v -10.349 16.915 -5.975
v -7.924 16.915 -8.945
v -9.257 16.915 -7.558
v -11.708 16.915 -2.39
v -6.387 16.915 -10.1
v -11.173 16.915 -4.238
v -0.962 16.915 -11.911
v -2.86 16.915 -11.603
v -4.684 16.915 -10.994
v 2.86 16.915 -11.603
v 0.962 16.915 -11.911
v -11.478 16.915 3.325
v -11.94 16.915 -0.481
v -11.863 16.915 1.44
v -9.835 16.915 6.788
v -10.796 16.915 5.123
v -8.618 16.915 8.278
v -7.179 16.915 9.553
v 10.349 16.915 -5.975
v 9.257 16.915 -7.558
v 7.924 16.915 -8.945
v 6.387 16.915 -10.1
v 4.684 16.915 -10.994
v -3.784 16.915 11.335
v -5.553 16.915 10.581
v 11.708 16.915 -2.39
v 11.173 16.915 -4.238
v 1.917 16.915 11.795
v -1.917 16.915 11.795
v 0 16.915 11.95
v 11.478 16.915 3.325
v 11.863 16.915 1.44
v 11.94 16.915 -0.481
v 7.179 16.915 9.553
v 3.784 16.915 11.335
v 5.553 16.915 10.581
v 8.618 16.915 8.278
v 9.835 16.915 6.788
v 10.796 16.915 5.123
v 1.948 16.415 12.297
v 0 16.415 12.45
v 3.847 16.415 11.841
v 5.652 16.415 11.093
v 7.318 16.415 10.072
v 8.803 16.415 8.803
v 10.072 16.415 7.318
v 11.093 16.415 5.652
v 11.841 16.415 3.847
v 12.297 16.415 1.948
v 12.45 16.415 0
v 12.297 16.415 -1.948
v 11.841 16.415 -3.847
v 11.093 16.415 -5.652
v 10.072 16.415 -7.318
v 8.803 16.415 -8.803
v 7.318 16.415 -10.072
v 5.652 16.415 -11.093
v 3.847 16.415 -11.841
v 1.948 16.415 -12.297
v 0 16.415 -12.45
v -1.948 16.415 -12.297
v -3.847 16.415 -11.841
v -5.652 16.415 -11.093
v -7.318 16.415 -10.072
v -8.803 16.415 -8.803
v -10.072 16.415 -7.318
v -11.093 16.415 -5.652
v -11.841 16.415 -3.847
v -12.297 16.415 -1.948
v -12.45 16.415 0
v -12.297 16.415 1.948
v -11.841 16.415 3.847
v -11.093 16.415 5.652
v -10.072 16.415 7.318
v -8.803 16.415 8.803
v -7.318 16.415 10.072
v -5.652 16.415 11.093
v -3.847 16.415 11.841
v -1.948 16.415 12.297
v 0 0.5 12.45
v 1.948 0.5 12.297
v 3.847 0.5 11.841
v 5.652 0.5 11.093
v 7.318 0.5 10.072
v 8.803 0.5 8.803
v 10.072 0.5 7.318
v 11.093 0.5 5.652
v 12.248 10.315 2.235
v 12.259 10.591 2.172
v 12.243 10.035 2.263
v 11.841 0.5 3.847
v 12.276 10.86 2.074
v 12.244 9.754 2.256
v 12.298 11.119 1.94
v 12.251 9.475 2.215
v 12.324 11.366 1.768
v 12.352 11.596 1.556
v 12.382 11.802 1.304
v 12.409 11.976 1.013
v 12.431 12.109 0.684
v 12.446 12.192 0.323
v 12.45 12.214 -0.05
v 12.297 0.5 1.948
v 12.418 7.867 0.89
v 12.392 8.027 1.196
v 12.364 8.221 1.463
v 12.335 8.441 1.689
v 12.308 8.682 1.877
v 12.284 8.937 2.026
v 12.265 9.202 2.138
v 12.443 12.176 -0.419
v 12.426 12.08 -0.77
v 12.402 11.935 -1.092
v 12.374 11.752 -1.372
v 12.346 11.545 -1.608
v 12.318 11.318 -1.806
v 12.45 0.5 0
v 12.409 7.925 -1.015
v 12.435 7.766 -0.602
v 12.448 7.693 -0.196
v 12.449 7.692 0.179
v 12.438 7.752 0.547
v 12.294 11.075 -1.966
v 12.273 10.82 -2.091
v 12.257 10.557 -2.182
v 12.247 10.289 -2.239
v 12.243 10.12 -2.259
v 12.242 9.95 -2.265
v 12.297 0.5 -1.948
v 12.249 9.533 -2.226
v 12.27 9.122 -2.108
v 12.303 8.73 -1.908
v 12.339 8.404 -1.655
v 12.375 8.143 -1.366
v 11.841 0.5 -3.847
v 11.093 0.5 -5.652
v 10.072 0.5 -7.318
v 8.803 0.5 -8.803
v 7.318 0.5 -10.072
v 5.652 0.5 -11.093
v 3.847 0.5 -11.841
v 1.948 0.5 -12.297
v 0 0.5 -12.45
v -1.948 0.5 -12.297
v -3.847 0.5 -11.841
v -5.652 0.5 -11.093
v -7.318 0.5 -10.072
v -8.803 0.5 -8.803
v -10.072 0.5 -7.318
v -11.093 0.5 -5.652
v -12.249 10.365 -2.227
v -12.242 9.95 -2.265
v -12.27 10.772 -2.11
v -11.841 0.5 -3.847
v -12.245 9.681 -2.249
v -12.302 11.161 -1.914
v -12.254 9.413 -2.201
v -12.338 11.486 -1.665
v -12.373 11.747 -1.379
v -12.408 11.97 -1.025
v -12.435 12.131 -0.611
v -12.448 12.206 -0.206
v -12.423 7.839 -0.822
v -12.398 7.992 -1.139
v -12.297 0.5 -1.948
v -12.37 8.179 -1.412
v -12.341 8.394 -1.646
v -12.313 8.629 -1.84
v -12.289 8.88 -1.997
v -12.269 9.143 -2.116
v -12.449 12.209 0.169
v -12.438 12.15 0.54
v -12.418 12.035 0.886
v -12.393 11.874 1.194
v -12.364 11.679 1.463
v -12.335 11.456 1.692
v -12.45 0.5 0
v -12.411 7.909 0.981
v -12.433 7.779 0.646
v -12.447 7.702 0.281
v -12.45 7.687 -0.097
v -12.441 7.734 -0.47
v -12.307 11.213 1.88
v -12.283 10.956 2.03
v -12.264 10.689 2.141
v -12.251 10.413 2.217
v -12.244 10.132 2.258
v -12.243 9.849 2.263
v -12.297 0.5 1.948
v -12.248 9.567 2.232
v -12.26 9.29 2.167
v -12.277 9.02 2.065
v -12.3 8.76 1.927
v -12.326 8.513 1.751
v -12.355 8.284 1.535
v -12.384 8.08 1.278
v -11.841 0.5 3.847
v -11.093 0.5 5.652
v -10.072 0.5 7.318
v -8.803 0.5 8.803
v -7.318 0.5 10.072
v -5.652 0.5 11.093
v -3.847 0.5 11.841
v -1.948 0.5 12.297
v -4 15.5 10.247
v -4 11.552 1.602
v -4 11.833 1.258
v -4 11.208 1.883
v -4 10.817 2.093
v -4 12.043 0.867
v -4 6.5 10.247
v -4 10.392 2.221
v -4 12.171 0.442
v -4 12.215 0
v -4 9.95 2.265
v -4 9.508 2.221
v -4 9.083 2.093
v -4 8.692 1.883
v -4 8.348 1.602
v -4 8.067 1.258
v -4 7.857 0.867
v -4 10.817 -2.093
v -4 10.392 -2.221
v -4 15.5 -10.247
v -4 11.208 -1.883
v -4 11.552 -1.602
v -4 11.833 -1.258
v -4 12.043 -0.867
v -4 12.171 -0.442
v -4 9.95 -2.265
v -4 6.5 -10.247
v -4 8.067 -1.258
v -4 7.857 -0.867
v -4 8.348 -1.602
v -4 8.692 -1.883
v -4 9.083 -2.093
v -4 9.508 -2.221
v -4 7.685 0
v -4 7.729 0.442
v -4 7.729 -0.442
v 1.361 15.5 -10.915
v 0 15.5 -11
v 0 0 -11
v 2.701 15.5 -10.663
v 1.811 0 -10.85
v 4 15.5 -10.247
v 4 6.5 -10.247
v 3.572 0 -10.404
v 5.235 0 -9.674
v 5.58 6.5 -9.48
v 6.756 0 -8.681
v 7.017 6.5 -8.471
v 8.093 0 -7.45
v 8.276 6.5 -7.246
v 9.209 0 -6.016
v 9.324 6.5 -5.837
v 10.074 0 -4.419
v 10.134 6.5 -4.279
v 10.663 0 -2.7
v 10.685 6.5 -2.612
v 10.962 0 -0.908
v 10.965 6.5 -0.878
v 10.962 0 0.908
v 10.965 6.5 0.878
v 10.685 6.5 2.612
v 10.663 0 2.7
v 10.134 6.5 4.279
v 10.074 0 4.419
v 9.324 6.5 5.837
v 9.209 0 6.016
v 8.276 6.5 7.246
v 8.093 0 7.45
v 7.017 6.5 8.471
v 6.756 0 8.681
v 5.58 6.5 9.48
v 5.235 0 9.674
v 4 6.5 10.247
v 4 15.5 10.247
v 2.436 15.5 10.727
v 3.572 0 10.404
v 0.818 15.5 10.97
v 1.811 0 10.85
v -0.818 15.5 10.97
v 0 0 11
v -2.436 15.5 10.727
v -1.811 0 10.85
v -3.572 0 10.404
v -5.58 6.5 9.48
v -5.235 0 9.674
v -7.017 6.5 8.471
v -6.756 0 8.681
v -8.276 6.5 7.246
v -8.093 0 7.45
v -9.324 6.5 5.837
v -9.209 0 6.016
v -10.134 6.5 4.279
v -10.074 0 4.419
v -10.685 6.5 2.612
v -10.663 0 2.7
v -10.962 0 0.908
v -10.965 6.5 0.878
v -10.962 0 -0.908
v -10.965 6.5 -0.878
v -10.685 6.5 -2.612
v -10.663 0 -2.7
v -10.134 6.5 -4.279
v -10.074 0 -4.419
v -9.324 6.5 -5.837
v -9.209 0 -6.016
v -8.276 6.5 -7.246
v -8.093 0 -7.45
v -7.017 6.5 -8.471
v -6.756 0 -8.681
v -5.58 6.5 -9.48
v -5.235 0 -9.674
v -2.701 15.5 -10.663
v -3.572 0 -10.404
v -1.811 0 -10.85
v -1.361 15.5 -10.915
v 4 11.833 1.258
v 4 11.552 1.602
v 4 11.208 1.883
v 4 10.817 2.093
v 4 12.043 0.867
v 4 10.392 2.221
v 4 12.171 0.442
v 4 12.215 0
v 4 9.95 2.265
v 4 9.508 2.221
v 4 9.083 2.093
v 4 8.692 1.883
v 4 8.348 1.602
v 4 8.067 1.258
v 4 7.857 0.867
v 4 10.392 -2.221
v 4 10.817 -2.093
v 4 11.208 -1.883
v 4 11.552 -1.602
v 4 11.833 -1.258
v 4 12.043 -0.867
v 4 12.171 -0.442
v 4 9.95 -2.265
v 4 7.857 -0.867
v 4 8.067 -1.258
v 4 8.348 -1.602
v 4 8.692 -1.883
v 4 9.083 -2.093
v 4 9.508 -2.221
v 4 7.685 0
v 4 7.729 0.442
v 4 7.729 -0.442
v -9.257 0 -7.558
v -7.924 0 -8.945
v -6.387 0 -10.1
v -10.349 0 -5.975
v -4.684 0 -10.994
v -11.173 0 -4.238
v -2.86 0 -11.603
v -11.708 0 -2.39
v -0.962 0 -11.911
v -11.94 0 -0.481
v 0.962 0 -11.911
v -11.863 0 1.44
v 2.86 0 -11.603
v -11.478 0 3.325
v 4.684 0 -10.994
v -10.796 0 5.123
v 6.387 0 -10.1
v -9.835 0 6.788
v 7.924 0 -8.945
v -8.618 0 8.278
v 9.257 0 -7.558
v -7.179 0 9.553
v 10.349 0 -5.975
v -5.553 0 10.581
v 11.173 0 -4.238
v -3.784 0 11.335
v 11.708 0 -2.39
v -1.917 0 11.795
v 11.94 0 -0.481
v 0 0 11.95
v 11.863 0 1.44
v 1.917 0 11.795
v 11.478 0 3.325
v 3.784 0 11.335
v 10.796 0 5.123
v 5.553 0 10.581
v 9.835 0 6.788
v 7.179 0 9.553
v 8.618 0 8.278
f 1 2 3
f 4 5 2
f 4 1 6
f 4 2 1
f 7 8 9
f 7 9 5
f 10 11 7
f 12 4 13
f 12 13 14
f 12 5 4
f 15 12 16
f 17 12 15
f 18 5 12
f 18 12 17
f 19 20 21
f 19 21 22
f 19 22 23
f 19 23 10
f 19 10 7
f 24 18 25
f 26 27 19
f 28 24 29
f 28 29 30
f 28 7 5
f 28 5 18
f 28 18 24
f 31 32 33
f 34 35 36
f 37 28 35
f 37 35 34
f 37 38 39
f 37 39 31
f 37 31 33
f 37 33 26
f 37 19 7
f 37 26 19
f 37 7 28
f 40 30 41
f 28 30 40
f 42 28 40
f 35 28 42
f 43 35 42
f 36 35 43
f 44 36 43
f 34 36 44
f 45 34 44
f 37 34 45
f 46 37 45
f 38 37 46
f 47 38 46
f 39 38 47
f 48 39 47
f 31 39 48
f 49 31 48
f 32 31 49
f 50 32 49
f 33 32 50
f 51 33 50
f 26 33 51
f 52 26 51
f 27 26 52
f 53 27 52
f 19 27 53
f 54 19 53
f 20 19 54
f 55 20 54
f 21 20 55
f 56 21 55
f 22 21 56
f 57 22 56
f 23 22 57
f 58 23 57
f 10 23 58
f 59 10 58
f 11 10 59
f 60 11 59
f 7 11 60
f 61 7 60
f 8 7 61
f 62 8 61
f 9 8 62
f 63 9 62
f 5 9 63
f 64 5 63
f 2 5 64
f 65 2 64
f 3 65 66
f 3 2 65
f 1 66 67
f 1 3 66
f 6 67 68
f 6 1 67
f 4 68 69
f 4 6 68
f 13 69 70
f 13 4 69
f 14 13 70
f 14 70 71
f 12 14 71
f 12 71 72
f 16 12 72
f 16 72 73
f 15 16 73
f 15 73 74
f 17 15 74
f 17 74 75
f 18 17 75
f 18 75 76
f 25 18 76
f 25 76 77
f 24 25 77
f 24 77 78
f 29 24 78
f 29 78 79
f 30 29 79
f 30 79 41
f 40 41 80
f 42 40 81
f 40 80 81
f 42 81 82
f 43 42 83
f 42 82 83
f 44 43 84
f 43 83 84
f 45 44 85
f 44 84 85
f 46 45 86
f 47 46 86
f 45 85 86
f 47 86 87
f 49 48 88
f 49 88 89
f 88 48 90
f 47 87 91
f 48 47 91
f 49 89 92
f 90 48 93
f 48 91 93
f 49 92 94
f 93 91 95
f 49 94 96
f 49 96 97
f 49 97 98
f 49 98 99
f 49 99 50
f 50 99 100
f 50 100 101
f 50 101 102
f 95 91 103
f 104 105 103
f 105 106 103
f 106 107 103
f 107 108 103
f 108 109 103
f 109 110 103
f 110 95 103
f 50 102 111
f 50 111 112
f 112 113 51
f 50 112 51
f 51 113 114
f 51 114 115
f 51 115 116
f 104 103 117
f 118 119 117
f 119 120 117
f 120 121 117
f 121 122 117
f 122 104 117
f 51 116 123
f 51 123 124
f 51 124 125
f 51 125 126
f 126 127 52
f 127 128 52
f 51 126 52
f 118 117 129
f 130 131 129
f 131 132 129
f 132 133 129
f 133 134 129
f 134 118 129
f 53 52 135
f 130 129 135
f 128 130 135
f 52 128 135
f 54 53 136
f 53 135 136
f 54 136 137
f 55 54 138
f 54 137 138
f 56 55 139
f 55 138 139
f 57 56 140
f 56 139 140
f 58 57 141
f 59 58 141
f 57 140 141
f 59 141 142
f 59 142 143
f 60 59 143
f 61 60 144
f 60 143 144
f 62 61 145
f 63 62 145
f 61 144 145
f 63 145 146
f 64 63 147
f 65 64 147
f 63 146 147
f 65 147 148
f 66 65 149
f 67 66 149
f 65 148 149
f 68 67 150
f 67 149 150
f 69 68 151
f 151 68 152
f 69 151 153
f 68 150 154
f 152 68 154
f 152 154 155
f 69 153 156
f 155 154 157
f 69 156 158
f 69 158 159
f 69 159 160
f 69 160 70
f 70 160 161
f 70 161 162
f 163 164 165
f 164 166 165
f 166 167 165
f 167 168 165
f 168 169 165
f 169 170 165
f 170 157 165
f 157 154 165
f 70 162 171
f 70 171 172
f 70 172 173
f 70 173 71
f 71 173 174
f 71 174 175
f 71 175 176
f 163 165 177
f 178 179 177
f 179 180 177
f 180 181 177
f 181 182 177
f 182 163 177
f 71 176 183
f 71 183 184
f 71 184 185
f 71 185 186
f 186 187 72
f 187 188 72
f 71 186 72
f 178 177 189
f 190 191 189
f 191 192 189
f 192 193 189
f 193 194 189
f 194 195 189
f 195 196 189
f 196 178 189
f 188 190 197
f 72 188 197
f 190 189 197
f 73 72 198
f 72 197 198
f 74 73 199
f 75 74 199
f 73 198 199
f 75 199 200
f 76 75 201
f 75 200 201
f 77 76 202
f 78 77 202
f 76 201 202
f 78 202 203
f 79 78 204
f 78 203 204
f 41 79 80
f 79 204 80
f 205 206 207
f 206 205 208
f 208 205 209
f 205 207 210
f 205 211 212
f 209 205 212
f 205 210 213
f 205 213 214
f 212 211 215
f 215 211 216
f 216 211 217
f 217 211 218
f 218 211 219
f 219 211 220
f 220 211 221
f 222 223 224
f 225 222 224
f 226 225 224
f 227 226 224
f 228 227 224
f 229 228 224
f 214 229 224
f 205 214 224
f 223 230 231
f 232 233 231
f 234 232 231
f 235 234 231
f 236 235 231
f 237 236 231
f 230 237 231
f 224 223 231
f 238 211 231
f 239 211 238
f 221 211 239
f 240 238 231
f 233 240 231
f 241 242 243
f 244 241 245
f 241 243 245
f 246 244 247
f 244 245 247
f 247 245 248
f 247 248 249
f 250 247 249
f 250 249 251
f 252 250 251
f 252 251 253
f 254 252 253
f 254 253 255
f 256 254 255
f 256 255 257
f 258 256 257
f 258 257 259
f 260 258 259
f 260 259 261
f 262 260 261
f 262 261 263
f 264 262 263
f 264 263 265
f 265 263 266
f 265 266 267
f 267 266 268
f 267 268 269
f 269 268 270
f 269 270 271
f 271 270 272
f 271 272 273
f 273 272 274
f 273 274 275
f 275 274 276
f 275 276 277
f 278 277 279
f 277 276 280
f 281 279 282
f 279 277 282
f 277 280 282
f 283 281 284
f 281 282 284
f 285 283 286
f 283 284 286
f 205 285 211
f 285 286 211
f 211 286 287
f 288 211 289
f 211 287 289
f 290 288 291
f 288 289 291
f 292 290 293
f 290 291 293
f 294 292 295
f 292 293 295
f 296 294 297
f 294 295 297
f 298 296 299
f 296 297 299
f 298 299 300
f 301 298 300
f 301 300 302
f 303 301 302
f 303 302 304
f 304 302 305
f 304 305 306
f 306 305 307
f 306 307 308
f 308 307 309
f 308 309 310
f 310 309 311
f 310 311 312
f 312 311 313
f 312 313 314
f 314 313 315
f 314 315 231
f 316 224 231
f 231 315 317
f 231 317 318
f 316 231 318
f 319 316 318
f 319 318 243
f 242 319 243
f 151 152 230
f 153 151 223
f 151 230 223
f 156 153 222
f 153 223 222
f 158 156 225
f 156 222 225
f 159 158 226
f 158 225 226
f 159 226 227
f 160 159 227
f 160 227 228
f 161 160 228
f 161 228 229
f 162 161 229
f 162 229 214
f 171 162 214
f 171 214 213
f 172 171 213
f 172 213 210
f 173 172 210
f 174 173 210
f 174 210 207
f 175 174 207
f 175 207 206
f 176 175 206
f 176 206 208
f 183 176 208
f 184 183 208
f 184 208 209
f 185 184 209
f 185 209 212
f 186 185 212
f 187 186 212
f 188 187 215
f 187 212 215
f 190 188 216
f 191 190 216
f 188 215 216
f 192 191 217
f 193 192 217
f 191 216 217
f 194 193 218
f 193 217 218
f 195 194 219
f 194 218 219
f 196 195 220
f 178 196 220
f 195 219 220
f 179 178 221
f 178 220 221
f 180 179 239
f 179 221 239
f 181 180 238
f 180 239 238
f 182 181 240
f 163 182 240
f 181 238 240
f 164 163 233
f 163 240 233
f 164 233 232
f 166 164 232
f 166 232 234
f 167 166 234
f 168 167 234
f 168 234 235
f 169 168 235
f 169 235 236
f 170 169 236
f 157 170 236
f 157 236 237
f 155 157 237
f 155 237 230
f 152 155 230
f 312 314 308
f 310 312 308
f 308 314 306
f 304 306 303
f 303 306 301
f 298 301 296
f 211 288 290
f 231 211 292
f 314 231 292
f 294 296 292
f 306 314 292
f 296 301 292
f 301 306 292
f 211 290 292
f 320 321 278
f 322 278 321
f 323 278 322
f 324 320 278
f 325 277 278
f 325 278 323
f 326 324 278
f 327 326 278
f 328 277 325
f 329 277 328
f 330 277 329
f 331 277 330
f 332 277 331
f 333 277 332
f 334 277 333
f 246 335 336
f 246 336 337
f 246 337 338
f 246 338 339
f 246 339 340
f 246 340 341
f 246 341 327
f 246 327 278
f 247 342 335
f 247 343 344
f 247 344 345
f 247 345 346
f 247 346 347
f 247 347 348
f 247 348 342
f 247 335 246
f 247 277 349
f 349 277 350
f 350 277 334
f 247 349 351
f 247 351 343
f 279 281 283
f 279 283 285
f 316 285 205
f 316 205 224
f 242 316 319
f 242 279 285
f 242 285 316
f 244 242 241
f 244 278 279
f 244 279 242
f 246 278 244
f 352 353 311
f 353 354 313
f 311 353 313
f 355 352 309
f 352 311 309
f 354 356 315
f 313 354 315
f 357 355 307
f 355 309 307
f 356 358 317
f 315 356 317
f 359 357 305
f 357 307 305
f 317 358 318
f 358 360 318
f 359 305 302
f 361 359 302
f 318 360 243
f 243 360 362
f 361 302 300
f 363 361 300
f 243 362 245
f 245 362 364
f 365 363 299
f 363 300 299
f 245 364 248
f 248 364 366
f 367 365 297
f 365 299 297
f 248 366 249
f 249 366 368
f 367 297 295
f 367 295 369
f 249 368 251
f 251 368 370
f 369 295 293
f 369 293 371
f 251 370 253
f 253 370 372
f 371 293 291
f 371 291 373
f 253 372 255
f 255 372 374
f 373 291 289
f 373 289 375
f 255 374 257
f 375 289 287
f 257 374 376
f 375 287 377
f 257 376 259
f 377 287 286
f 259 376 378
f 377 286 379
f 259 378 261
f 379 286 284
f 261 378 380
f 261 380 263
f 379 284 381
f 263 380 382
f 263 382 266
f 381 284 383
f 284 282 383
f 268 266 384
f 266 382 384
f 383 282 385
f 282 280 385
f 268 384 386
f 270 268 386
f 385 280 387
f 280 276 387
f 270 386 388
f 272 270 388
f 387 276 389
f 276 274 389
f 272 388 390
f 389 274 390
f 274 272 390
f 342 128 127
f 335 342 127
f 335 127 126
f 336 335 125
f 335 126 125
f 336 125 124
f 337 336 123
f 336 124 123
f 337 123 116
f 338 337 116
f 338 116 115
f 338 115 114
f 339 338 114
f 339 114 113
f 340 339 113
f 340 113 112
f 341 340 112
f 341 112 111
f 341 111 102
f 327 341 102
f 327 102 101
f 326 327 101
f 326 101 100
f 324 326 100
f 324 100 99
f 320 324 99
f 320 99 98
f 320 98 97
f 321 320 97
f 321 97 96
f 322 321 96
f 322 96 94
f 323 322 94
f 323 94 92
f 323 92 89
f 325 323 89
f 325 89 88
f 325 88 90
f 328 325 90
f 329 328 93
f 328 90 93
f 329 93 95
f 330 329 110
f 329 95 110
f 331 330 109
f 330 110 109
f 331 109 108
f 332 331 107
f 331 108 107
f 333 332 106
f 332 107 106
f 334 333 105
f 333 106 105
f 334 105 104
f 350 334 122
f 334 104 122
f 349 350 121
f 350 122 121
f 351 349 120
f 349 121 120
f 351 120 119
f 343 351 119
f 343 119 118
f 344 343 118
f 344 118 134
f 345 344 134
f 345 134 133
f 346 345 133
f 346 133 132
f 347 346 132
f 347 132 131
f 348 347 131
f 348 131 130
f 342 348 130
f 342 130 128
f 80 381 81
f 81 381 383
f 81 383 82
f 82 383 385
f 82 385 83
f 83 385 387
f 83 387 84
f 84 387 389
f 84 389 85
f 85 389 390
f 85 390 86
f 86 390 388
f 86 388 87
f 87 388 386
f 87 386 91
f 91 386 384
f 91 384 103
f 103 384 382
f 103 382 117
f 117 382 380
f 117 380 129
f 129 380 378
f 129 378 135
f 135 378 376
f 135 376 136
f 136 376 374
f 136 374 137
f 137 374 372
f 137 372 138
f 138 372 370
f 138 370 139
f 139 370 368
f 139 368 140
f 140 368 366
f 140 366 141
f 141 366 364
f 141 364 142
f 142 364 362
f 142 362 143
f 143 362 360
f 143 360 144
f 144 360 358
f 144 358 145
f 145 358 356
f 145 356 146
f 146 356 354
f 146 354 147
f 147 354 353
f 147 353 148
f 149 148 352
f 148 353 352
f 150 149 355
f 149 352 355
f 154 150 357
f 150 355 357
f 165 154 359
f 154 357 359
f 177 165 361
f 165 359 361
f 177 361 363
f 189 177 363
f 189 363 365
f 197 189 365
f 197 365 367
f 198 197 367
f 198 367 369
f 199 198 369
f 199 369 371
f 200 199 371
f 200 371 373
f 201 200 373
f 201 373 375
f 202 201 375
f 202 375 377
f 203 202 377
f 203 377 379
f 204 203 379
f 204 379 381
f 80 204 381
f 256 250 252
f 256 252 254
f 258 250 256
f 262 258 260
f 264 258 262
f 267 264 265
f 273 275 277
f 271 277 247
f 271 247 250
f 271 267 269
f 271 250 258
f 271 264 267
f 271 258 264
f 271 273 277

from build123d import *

# Parameters (mm, degrees)
SKETCH2_R           = 12.45
BOSS_EXTRUDE1_DEPTH = 16.915
SKETCH6_R           = 11
CUT_EXTRUDE2_DEPTH  = 15.5
BOSS_EXTRUDE2_START = 9
BOSS_EXTRUDE2_DEPTH = 9
SKETCH5_R           = 2.265
CUT_EXTRUDE1_DEPTH  = 33.574986186
CHAMFER1_SIZE       = 0.5
CHAMFER2_SIZE       = 0.5


with BuildPart() as part:
    # Sketch2 → Boss-Extrude1 (new body)
    with BuildSketch(Plane(origin=(0, 0, 0), x_dir=(1, 0, 0), z_dir=(0, 1, 0))):
        with Locations(Location((0, 0, 0), (0, 0, 270))):
            Circle(SKETCH2_R)
    extrude(amount=BOSS_EXTRUDE1_DEPTH)

    # Sketch6 → Cut-Extrude2 (cut)
    with BuildSketch(Plane.XZ):
        with Locations(Location((0, 0, 0), (0, 0, 270))):
            Circle(SKETCH6_R)
    extrude(amount=-CUT_EXTRUDE2_DEPTH, mode=Mode.SUBTRACT)

    # Sketch7 → Boss-Extrude2 (add)
    with BuildSketch(Plane.XZ.offset(-15.5).offset(BOSS_EXTRUDE2_START)):
        with BuildLine():
            Line((-4, 10.246950766), (-4, -10.246950766))
            ThreePointArc((-4, -10.246950766), (-11, 0), (-4, 10.246950766))
        make_face()
        with BuildLine():
            Line((4, 10.246950766), (4, -10.246950766))
            ThreePointArc((4, -10.246950766), (11, 0), (4, 10.246950766))
        make_face()
    extrude(amount=-BOSS_EXTRUDE2_DEPTH)

    # Sketch5 → Cut-Extrude1 (cut, through all)
    with BuildSketch(Plane(origin=(12.45, 0, 0), x_dir=(0, 0, -1), z_dir=(1, 0, 0))):
        with Locations((0, 9.95)):
            Circle(SKETCH5_R)
    extrude(amount=-CUT_EXTRUDE1_DEPTH, mode=Mode.SUBTRACT)

    # Chamfer1
    chamfer1_edges = [part.edges().sort_by_distance(p)[0] for p in [
        (0, 16.915, -12.45),
    ]]
    chamfer(chamfer1_edges, length=CHAMFER1_SIZE)

    # Chamfer2
    chamfer2_edges = [part.edges().sort_by_distance(p)[0] for p in [
        (0, 0, -12.45),
    ]]
    chamfer(chamfer2_edges, length=CHAMFER2_SIZE)


solid = part.part
